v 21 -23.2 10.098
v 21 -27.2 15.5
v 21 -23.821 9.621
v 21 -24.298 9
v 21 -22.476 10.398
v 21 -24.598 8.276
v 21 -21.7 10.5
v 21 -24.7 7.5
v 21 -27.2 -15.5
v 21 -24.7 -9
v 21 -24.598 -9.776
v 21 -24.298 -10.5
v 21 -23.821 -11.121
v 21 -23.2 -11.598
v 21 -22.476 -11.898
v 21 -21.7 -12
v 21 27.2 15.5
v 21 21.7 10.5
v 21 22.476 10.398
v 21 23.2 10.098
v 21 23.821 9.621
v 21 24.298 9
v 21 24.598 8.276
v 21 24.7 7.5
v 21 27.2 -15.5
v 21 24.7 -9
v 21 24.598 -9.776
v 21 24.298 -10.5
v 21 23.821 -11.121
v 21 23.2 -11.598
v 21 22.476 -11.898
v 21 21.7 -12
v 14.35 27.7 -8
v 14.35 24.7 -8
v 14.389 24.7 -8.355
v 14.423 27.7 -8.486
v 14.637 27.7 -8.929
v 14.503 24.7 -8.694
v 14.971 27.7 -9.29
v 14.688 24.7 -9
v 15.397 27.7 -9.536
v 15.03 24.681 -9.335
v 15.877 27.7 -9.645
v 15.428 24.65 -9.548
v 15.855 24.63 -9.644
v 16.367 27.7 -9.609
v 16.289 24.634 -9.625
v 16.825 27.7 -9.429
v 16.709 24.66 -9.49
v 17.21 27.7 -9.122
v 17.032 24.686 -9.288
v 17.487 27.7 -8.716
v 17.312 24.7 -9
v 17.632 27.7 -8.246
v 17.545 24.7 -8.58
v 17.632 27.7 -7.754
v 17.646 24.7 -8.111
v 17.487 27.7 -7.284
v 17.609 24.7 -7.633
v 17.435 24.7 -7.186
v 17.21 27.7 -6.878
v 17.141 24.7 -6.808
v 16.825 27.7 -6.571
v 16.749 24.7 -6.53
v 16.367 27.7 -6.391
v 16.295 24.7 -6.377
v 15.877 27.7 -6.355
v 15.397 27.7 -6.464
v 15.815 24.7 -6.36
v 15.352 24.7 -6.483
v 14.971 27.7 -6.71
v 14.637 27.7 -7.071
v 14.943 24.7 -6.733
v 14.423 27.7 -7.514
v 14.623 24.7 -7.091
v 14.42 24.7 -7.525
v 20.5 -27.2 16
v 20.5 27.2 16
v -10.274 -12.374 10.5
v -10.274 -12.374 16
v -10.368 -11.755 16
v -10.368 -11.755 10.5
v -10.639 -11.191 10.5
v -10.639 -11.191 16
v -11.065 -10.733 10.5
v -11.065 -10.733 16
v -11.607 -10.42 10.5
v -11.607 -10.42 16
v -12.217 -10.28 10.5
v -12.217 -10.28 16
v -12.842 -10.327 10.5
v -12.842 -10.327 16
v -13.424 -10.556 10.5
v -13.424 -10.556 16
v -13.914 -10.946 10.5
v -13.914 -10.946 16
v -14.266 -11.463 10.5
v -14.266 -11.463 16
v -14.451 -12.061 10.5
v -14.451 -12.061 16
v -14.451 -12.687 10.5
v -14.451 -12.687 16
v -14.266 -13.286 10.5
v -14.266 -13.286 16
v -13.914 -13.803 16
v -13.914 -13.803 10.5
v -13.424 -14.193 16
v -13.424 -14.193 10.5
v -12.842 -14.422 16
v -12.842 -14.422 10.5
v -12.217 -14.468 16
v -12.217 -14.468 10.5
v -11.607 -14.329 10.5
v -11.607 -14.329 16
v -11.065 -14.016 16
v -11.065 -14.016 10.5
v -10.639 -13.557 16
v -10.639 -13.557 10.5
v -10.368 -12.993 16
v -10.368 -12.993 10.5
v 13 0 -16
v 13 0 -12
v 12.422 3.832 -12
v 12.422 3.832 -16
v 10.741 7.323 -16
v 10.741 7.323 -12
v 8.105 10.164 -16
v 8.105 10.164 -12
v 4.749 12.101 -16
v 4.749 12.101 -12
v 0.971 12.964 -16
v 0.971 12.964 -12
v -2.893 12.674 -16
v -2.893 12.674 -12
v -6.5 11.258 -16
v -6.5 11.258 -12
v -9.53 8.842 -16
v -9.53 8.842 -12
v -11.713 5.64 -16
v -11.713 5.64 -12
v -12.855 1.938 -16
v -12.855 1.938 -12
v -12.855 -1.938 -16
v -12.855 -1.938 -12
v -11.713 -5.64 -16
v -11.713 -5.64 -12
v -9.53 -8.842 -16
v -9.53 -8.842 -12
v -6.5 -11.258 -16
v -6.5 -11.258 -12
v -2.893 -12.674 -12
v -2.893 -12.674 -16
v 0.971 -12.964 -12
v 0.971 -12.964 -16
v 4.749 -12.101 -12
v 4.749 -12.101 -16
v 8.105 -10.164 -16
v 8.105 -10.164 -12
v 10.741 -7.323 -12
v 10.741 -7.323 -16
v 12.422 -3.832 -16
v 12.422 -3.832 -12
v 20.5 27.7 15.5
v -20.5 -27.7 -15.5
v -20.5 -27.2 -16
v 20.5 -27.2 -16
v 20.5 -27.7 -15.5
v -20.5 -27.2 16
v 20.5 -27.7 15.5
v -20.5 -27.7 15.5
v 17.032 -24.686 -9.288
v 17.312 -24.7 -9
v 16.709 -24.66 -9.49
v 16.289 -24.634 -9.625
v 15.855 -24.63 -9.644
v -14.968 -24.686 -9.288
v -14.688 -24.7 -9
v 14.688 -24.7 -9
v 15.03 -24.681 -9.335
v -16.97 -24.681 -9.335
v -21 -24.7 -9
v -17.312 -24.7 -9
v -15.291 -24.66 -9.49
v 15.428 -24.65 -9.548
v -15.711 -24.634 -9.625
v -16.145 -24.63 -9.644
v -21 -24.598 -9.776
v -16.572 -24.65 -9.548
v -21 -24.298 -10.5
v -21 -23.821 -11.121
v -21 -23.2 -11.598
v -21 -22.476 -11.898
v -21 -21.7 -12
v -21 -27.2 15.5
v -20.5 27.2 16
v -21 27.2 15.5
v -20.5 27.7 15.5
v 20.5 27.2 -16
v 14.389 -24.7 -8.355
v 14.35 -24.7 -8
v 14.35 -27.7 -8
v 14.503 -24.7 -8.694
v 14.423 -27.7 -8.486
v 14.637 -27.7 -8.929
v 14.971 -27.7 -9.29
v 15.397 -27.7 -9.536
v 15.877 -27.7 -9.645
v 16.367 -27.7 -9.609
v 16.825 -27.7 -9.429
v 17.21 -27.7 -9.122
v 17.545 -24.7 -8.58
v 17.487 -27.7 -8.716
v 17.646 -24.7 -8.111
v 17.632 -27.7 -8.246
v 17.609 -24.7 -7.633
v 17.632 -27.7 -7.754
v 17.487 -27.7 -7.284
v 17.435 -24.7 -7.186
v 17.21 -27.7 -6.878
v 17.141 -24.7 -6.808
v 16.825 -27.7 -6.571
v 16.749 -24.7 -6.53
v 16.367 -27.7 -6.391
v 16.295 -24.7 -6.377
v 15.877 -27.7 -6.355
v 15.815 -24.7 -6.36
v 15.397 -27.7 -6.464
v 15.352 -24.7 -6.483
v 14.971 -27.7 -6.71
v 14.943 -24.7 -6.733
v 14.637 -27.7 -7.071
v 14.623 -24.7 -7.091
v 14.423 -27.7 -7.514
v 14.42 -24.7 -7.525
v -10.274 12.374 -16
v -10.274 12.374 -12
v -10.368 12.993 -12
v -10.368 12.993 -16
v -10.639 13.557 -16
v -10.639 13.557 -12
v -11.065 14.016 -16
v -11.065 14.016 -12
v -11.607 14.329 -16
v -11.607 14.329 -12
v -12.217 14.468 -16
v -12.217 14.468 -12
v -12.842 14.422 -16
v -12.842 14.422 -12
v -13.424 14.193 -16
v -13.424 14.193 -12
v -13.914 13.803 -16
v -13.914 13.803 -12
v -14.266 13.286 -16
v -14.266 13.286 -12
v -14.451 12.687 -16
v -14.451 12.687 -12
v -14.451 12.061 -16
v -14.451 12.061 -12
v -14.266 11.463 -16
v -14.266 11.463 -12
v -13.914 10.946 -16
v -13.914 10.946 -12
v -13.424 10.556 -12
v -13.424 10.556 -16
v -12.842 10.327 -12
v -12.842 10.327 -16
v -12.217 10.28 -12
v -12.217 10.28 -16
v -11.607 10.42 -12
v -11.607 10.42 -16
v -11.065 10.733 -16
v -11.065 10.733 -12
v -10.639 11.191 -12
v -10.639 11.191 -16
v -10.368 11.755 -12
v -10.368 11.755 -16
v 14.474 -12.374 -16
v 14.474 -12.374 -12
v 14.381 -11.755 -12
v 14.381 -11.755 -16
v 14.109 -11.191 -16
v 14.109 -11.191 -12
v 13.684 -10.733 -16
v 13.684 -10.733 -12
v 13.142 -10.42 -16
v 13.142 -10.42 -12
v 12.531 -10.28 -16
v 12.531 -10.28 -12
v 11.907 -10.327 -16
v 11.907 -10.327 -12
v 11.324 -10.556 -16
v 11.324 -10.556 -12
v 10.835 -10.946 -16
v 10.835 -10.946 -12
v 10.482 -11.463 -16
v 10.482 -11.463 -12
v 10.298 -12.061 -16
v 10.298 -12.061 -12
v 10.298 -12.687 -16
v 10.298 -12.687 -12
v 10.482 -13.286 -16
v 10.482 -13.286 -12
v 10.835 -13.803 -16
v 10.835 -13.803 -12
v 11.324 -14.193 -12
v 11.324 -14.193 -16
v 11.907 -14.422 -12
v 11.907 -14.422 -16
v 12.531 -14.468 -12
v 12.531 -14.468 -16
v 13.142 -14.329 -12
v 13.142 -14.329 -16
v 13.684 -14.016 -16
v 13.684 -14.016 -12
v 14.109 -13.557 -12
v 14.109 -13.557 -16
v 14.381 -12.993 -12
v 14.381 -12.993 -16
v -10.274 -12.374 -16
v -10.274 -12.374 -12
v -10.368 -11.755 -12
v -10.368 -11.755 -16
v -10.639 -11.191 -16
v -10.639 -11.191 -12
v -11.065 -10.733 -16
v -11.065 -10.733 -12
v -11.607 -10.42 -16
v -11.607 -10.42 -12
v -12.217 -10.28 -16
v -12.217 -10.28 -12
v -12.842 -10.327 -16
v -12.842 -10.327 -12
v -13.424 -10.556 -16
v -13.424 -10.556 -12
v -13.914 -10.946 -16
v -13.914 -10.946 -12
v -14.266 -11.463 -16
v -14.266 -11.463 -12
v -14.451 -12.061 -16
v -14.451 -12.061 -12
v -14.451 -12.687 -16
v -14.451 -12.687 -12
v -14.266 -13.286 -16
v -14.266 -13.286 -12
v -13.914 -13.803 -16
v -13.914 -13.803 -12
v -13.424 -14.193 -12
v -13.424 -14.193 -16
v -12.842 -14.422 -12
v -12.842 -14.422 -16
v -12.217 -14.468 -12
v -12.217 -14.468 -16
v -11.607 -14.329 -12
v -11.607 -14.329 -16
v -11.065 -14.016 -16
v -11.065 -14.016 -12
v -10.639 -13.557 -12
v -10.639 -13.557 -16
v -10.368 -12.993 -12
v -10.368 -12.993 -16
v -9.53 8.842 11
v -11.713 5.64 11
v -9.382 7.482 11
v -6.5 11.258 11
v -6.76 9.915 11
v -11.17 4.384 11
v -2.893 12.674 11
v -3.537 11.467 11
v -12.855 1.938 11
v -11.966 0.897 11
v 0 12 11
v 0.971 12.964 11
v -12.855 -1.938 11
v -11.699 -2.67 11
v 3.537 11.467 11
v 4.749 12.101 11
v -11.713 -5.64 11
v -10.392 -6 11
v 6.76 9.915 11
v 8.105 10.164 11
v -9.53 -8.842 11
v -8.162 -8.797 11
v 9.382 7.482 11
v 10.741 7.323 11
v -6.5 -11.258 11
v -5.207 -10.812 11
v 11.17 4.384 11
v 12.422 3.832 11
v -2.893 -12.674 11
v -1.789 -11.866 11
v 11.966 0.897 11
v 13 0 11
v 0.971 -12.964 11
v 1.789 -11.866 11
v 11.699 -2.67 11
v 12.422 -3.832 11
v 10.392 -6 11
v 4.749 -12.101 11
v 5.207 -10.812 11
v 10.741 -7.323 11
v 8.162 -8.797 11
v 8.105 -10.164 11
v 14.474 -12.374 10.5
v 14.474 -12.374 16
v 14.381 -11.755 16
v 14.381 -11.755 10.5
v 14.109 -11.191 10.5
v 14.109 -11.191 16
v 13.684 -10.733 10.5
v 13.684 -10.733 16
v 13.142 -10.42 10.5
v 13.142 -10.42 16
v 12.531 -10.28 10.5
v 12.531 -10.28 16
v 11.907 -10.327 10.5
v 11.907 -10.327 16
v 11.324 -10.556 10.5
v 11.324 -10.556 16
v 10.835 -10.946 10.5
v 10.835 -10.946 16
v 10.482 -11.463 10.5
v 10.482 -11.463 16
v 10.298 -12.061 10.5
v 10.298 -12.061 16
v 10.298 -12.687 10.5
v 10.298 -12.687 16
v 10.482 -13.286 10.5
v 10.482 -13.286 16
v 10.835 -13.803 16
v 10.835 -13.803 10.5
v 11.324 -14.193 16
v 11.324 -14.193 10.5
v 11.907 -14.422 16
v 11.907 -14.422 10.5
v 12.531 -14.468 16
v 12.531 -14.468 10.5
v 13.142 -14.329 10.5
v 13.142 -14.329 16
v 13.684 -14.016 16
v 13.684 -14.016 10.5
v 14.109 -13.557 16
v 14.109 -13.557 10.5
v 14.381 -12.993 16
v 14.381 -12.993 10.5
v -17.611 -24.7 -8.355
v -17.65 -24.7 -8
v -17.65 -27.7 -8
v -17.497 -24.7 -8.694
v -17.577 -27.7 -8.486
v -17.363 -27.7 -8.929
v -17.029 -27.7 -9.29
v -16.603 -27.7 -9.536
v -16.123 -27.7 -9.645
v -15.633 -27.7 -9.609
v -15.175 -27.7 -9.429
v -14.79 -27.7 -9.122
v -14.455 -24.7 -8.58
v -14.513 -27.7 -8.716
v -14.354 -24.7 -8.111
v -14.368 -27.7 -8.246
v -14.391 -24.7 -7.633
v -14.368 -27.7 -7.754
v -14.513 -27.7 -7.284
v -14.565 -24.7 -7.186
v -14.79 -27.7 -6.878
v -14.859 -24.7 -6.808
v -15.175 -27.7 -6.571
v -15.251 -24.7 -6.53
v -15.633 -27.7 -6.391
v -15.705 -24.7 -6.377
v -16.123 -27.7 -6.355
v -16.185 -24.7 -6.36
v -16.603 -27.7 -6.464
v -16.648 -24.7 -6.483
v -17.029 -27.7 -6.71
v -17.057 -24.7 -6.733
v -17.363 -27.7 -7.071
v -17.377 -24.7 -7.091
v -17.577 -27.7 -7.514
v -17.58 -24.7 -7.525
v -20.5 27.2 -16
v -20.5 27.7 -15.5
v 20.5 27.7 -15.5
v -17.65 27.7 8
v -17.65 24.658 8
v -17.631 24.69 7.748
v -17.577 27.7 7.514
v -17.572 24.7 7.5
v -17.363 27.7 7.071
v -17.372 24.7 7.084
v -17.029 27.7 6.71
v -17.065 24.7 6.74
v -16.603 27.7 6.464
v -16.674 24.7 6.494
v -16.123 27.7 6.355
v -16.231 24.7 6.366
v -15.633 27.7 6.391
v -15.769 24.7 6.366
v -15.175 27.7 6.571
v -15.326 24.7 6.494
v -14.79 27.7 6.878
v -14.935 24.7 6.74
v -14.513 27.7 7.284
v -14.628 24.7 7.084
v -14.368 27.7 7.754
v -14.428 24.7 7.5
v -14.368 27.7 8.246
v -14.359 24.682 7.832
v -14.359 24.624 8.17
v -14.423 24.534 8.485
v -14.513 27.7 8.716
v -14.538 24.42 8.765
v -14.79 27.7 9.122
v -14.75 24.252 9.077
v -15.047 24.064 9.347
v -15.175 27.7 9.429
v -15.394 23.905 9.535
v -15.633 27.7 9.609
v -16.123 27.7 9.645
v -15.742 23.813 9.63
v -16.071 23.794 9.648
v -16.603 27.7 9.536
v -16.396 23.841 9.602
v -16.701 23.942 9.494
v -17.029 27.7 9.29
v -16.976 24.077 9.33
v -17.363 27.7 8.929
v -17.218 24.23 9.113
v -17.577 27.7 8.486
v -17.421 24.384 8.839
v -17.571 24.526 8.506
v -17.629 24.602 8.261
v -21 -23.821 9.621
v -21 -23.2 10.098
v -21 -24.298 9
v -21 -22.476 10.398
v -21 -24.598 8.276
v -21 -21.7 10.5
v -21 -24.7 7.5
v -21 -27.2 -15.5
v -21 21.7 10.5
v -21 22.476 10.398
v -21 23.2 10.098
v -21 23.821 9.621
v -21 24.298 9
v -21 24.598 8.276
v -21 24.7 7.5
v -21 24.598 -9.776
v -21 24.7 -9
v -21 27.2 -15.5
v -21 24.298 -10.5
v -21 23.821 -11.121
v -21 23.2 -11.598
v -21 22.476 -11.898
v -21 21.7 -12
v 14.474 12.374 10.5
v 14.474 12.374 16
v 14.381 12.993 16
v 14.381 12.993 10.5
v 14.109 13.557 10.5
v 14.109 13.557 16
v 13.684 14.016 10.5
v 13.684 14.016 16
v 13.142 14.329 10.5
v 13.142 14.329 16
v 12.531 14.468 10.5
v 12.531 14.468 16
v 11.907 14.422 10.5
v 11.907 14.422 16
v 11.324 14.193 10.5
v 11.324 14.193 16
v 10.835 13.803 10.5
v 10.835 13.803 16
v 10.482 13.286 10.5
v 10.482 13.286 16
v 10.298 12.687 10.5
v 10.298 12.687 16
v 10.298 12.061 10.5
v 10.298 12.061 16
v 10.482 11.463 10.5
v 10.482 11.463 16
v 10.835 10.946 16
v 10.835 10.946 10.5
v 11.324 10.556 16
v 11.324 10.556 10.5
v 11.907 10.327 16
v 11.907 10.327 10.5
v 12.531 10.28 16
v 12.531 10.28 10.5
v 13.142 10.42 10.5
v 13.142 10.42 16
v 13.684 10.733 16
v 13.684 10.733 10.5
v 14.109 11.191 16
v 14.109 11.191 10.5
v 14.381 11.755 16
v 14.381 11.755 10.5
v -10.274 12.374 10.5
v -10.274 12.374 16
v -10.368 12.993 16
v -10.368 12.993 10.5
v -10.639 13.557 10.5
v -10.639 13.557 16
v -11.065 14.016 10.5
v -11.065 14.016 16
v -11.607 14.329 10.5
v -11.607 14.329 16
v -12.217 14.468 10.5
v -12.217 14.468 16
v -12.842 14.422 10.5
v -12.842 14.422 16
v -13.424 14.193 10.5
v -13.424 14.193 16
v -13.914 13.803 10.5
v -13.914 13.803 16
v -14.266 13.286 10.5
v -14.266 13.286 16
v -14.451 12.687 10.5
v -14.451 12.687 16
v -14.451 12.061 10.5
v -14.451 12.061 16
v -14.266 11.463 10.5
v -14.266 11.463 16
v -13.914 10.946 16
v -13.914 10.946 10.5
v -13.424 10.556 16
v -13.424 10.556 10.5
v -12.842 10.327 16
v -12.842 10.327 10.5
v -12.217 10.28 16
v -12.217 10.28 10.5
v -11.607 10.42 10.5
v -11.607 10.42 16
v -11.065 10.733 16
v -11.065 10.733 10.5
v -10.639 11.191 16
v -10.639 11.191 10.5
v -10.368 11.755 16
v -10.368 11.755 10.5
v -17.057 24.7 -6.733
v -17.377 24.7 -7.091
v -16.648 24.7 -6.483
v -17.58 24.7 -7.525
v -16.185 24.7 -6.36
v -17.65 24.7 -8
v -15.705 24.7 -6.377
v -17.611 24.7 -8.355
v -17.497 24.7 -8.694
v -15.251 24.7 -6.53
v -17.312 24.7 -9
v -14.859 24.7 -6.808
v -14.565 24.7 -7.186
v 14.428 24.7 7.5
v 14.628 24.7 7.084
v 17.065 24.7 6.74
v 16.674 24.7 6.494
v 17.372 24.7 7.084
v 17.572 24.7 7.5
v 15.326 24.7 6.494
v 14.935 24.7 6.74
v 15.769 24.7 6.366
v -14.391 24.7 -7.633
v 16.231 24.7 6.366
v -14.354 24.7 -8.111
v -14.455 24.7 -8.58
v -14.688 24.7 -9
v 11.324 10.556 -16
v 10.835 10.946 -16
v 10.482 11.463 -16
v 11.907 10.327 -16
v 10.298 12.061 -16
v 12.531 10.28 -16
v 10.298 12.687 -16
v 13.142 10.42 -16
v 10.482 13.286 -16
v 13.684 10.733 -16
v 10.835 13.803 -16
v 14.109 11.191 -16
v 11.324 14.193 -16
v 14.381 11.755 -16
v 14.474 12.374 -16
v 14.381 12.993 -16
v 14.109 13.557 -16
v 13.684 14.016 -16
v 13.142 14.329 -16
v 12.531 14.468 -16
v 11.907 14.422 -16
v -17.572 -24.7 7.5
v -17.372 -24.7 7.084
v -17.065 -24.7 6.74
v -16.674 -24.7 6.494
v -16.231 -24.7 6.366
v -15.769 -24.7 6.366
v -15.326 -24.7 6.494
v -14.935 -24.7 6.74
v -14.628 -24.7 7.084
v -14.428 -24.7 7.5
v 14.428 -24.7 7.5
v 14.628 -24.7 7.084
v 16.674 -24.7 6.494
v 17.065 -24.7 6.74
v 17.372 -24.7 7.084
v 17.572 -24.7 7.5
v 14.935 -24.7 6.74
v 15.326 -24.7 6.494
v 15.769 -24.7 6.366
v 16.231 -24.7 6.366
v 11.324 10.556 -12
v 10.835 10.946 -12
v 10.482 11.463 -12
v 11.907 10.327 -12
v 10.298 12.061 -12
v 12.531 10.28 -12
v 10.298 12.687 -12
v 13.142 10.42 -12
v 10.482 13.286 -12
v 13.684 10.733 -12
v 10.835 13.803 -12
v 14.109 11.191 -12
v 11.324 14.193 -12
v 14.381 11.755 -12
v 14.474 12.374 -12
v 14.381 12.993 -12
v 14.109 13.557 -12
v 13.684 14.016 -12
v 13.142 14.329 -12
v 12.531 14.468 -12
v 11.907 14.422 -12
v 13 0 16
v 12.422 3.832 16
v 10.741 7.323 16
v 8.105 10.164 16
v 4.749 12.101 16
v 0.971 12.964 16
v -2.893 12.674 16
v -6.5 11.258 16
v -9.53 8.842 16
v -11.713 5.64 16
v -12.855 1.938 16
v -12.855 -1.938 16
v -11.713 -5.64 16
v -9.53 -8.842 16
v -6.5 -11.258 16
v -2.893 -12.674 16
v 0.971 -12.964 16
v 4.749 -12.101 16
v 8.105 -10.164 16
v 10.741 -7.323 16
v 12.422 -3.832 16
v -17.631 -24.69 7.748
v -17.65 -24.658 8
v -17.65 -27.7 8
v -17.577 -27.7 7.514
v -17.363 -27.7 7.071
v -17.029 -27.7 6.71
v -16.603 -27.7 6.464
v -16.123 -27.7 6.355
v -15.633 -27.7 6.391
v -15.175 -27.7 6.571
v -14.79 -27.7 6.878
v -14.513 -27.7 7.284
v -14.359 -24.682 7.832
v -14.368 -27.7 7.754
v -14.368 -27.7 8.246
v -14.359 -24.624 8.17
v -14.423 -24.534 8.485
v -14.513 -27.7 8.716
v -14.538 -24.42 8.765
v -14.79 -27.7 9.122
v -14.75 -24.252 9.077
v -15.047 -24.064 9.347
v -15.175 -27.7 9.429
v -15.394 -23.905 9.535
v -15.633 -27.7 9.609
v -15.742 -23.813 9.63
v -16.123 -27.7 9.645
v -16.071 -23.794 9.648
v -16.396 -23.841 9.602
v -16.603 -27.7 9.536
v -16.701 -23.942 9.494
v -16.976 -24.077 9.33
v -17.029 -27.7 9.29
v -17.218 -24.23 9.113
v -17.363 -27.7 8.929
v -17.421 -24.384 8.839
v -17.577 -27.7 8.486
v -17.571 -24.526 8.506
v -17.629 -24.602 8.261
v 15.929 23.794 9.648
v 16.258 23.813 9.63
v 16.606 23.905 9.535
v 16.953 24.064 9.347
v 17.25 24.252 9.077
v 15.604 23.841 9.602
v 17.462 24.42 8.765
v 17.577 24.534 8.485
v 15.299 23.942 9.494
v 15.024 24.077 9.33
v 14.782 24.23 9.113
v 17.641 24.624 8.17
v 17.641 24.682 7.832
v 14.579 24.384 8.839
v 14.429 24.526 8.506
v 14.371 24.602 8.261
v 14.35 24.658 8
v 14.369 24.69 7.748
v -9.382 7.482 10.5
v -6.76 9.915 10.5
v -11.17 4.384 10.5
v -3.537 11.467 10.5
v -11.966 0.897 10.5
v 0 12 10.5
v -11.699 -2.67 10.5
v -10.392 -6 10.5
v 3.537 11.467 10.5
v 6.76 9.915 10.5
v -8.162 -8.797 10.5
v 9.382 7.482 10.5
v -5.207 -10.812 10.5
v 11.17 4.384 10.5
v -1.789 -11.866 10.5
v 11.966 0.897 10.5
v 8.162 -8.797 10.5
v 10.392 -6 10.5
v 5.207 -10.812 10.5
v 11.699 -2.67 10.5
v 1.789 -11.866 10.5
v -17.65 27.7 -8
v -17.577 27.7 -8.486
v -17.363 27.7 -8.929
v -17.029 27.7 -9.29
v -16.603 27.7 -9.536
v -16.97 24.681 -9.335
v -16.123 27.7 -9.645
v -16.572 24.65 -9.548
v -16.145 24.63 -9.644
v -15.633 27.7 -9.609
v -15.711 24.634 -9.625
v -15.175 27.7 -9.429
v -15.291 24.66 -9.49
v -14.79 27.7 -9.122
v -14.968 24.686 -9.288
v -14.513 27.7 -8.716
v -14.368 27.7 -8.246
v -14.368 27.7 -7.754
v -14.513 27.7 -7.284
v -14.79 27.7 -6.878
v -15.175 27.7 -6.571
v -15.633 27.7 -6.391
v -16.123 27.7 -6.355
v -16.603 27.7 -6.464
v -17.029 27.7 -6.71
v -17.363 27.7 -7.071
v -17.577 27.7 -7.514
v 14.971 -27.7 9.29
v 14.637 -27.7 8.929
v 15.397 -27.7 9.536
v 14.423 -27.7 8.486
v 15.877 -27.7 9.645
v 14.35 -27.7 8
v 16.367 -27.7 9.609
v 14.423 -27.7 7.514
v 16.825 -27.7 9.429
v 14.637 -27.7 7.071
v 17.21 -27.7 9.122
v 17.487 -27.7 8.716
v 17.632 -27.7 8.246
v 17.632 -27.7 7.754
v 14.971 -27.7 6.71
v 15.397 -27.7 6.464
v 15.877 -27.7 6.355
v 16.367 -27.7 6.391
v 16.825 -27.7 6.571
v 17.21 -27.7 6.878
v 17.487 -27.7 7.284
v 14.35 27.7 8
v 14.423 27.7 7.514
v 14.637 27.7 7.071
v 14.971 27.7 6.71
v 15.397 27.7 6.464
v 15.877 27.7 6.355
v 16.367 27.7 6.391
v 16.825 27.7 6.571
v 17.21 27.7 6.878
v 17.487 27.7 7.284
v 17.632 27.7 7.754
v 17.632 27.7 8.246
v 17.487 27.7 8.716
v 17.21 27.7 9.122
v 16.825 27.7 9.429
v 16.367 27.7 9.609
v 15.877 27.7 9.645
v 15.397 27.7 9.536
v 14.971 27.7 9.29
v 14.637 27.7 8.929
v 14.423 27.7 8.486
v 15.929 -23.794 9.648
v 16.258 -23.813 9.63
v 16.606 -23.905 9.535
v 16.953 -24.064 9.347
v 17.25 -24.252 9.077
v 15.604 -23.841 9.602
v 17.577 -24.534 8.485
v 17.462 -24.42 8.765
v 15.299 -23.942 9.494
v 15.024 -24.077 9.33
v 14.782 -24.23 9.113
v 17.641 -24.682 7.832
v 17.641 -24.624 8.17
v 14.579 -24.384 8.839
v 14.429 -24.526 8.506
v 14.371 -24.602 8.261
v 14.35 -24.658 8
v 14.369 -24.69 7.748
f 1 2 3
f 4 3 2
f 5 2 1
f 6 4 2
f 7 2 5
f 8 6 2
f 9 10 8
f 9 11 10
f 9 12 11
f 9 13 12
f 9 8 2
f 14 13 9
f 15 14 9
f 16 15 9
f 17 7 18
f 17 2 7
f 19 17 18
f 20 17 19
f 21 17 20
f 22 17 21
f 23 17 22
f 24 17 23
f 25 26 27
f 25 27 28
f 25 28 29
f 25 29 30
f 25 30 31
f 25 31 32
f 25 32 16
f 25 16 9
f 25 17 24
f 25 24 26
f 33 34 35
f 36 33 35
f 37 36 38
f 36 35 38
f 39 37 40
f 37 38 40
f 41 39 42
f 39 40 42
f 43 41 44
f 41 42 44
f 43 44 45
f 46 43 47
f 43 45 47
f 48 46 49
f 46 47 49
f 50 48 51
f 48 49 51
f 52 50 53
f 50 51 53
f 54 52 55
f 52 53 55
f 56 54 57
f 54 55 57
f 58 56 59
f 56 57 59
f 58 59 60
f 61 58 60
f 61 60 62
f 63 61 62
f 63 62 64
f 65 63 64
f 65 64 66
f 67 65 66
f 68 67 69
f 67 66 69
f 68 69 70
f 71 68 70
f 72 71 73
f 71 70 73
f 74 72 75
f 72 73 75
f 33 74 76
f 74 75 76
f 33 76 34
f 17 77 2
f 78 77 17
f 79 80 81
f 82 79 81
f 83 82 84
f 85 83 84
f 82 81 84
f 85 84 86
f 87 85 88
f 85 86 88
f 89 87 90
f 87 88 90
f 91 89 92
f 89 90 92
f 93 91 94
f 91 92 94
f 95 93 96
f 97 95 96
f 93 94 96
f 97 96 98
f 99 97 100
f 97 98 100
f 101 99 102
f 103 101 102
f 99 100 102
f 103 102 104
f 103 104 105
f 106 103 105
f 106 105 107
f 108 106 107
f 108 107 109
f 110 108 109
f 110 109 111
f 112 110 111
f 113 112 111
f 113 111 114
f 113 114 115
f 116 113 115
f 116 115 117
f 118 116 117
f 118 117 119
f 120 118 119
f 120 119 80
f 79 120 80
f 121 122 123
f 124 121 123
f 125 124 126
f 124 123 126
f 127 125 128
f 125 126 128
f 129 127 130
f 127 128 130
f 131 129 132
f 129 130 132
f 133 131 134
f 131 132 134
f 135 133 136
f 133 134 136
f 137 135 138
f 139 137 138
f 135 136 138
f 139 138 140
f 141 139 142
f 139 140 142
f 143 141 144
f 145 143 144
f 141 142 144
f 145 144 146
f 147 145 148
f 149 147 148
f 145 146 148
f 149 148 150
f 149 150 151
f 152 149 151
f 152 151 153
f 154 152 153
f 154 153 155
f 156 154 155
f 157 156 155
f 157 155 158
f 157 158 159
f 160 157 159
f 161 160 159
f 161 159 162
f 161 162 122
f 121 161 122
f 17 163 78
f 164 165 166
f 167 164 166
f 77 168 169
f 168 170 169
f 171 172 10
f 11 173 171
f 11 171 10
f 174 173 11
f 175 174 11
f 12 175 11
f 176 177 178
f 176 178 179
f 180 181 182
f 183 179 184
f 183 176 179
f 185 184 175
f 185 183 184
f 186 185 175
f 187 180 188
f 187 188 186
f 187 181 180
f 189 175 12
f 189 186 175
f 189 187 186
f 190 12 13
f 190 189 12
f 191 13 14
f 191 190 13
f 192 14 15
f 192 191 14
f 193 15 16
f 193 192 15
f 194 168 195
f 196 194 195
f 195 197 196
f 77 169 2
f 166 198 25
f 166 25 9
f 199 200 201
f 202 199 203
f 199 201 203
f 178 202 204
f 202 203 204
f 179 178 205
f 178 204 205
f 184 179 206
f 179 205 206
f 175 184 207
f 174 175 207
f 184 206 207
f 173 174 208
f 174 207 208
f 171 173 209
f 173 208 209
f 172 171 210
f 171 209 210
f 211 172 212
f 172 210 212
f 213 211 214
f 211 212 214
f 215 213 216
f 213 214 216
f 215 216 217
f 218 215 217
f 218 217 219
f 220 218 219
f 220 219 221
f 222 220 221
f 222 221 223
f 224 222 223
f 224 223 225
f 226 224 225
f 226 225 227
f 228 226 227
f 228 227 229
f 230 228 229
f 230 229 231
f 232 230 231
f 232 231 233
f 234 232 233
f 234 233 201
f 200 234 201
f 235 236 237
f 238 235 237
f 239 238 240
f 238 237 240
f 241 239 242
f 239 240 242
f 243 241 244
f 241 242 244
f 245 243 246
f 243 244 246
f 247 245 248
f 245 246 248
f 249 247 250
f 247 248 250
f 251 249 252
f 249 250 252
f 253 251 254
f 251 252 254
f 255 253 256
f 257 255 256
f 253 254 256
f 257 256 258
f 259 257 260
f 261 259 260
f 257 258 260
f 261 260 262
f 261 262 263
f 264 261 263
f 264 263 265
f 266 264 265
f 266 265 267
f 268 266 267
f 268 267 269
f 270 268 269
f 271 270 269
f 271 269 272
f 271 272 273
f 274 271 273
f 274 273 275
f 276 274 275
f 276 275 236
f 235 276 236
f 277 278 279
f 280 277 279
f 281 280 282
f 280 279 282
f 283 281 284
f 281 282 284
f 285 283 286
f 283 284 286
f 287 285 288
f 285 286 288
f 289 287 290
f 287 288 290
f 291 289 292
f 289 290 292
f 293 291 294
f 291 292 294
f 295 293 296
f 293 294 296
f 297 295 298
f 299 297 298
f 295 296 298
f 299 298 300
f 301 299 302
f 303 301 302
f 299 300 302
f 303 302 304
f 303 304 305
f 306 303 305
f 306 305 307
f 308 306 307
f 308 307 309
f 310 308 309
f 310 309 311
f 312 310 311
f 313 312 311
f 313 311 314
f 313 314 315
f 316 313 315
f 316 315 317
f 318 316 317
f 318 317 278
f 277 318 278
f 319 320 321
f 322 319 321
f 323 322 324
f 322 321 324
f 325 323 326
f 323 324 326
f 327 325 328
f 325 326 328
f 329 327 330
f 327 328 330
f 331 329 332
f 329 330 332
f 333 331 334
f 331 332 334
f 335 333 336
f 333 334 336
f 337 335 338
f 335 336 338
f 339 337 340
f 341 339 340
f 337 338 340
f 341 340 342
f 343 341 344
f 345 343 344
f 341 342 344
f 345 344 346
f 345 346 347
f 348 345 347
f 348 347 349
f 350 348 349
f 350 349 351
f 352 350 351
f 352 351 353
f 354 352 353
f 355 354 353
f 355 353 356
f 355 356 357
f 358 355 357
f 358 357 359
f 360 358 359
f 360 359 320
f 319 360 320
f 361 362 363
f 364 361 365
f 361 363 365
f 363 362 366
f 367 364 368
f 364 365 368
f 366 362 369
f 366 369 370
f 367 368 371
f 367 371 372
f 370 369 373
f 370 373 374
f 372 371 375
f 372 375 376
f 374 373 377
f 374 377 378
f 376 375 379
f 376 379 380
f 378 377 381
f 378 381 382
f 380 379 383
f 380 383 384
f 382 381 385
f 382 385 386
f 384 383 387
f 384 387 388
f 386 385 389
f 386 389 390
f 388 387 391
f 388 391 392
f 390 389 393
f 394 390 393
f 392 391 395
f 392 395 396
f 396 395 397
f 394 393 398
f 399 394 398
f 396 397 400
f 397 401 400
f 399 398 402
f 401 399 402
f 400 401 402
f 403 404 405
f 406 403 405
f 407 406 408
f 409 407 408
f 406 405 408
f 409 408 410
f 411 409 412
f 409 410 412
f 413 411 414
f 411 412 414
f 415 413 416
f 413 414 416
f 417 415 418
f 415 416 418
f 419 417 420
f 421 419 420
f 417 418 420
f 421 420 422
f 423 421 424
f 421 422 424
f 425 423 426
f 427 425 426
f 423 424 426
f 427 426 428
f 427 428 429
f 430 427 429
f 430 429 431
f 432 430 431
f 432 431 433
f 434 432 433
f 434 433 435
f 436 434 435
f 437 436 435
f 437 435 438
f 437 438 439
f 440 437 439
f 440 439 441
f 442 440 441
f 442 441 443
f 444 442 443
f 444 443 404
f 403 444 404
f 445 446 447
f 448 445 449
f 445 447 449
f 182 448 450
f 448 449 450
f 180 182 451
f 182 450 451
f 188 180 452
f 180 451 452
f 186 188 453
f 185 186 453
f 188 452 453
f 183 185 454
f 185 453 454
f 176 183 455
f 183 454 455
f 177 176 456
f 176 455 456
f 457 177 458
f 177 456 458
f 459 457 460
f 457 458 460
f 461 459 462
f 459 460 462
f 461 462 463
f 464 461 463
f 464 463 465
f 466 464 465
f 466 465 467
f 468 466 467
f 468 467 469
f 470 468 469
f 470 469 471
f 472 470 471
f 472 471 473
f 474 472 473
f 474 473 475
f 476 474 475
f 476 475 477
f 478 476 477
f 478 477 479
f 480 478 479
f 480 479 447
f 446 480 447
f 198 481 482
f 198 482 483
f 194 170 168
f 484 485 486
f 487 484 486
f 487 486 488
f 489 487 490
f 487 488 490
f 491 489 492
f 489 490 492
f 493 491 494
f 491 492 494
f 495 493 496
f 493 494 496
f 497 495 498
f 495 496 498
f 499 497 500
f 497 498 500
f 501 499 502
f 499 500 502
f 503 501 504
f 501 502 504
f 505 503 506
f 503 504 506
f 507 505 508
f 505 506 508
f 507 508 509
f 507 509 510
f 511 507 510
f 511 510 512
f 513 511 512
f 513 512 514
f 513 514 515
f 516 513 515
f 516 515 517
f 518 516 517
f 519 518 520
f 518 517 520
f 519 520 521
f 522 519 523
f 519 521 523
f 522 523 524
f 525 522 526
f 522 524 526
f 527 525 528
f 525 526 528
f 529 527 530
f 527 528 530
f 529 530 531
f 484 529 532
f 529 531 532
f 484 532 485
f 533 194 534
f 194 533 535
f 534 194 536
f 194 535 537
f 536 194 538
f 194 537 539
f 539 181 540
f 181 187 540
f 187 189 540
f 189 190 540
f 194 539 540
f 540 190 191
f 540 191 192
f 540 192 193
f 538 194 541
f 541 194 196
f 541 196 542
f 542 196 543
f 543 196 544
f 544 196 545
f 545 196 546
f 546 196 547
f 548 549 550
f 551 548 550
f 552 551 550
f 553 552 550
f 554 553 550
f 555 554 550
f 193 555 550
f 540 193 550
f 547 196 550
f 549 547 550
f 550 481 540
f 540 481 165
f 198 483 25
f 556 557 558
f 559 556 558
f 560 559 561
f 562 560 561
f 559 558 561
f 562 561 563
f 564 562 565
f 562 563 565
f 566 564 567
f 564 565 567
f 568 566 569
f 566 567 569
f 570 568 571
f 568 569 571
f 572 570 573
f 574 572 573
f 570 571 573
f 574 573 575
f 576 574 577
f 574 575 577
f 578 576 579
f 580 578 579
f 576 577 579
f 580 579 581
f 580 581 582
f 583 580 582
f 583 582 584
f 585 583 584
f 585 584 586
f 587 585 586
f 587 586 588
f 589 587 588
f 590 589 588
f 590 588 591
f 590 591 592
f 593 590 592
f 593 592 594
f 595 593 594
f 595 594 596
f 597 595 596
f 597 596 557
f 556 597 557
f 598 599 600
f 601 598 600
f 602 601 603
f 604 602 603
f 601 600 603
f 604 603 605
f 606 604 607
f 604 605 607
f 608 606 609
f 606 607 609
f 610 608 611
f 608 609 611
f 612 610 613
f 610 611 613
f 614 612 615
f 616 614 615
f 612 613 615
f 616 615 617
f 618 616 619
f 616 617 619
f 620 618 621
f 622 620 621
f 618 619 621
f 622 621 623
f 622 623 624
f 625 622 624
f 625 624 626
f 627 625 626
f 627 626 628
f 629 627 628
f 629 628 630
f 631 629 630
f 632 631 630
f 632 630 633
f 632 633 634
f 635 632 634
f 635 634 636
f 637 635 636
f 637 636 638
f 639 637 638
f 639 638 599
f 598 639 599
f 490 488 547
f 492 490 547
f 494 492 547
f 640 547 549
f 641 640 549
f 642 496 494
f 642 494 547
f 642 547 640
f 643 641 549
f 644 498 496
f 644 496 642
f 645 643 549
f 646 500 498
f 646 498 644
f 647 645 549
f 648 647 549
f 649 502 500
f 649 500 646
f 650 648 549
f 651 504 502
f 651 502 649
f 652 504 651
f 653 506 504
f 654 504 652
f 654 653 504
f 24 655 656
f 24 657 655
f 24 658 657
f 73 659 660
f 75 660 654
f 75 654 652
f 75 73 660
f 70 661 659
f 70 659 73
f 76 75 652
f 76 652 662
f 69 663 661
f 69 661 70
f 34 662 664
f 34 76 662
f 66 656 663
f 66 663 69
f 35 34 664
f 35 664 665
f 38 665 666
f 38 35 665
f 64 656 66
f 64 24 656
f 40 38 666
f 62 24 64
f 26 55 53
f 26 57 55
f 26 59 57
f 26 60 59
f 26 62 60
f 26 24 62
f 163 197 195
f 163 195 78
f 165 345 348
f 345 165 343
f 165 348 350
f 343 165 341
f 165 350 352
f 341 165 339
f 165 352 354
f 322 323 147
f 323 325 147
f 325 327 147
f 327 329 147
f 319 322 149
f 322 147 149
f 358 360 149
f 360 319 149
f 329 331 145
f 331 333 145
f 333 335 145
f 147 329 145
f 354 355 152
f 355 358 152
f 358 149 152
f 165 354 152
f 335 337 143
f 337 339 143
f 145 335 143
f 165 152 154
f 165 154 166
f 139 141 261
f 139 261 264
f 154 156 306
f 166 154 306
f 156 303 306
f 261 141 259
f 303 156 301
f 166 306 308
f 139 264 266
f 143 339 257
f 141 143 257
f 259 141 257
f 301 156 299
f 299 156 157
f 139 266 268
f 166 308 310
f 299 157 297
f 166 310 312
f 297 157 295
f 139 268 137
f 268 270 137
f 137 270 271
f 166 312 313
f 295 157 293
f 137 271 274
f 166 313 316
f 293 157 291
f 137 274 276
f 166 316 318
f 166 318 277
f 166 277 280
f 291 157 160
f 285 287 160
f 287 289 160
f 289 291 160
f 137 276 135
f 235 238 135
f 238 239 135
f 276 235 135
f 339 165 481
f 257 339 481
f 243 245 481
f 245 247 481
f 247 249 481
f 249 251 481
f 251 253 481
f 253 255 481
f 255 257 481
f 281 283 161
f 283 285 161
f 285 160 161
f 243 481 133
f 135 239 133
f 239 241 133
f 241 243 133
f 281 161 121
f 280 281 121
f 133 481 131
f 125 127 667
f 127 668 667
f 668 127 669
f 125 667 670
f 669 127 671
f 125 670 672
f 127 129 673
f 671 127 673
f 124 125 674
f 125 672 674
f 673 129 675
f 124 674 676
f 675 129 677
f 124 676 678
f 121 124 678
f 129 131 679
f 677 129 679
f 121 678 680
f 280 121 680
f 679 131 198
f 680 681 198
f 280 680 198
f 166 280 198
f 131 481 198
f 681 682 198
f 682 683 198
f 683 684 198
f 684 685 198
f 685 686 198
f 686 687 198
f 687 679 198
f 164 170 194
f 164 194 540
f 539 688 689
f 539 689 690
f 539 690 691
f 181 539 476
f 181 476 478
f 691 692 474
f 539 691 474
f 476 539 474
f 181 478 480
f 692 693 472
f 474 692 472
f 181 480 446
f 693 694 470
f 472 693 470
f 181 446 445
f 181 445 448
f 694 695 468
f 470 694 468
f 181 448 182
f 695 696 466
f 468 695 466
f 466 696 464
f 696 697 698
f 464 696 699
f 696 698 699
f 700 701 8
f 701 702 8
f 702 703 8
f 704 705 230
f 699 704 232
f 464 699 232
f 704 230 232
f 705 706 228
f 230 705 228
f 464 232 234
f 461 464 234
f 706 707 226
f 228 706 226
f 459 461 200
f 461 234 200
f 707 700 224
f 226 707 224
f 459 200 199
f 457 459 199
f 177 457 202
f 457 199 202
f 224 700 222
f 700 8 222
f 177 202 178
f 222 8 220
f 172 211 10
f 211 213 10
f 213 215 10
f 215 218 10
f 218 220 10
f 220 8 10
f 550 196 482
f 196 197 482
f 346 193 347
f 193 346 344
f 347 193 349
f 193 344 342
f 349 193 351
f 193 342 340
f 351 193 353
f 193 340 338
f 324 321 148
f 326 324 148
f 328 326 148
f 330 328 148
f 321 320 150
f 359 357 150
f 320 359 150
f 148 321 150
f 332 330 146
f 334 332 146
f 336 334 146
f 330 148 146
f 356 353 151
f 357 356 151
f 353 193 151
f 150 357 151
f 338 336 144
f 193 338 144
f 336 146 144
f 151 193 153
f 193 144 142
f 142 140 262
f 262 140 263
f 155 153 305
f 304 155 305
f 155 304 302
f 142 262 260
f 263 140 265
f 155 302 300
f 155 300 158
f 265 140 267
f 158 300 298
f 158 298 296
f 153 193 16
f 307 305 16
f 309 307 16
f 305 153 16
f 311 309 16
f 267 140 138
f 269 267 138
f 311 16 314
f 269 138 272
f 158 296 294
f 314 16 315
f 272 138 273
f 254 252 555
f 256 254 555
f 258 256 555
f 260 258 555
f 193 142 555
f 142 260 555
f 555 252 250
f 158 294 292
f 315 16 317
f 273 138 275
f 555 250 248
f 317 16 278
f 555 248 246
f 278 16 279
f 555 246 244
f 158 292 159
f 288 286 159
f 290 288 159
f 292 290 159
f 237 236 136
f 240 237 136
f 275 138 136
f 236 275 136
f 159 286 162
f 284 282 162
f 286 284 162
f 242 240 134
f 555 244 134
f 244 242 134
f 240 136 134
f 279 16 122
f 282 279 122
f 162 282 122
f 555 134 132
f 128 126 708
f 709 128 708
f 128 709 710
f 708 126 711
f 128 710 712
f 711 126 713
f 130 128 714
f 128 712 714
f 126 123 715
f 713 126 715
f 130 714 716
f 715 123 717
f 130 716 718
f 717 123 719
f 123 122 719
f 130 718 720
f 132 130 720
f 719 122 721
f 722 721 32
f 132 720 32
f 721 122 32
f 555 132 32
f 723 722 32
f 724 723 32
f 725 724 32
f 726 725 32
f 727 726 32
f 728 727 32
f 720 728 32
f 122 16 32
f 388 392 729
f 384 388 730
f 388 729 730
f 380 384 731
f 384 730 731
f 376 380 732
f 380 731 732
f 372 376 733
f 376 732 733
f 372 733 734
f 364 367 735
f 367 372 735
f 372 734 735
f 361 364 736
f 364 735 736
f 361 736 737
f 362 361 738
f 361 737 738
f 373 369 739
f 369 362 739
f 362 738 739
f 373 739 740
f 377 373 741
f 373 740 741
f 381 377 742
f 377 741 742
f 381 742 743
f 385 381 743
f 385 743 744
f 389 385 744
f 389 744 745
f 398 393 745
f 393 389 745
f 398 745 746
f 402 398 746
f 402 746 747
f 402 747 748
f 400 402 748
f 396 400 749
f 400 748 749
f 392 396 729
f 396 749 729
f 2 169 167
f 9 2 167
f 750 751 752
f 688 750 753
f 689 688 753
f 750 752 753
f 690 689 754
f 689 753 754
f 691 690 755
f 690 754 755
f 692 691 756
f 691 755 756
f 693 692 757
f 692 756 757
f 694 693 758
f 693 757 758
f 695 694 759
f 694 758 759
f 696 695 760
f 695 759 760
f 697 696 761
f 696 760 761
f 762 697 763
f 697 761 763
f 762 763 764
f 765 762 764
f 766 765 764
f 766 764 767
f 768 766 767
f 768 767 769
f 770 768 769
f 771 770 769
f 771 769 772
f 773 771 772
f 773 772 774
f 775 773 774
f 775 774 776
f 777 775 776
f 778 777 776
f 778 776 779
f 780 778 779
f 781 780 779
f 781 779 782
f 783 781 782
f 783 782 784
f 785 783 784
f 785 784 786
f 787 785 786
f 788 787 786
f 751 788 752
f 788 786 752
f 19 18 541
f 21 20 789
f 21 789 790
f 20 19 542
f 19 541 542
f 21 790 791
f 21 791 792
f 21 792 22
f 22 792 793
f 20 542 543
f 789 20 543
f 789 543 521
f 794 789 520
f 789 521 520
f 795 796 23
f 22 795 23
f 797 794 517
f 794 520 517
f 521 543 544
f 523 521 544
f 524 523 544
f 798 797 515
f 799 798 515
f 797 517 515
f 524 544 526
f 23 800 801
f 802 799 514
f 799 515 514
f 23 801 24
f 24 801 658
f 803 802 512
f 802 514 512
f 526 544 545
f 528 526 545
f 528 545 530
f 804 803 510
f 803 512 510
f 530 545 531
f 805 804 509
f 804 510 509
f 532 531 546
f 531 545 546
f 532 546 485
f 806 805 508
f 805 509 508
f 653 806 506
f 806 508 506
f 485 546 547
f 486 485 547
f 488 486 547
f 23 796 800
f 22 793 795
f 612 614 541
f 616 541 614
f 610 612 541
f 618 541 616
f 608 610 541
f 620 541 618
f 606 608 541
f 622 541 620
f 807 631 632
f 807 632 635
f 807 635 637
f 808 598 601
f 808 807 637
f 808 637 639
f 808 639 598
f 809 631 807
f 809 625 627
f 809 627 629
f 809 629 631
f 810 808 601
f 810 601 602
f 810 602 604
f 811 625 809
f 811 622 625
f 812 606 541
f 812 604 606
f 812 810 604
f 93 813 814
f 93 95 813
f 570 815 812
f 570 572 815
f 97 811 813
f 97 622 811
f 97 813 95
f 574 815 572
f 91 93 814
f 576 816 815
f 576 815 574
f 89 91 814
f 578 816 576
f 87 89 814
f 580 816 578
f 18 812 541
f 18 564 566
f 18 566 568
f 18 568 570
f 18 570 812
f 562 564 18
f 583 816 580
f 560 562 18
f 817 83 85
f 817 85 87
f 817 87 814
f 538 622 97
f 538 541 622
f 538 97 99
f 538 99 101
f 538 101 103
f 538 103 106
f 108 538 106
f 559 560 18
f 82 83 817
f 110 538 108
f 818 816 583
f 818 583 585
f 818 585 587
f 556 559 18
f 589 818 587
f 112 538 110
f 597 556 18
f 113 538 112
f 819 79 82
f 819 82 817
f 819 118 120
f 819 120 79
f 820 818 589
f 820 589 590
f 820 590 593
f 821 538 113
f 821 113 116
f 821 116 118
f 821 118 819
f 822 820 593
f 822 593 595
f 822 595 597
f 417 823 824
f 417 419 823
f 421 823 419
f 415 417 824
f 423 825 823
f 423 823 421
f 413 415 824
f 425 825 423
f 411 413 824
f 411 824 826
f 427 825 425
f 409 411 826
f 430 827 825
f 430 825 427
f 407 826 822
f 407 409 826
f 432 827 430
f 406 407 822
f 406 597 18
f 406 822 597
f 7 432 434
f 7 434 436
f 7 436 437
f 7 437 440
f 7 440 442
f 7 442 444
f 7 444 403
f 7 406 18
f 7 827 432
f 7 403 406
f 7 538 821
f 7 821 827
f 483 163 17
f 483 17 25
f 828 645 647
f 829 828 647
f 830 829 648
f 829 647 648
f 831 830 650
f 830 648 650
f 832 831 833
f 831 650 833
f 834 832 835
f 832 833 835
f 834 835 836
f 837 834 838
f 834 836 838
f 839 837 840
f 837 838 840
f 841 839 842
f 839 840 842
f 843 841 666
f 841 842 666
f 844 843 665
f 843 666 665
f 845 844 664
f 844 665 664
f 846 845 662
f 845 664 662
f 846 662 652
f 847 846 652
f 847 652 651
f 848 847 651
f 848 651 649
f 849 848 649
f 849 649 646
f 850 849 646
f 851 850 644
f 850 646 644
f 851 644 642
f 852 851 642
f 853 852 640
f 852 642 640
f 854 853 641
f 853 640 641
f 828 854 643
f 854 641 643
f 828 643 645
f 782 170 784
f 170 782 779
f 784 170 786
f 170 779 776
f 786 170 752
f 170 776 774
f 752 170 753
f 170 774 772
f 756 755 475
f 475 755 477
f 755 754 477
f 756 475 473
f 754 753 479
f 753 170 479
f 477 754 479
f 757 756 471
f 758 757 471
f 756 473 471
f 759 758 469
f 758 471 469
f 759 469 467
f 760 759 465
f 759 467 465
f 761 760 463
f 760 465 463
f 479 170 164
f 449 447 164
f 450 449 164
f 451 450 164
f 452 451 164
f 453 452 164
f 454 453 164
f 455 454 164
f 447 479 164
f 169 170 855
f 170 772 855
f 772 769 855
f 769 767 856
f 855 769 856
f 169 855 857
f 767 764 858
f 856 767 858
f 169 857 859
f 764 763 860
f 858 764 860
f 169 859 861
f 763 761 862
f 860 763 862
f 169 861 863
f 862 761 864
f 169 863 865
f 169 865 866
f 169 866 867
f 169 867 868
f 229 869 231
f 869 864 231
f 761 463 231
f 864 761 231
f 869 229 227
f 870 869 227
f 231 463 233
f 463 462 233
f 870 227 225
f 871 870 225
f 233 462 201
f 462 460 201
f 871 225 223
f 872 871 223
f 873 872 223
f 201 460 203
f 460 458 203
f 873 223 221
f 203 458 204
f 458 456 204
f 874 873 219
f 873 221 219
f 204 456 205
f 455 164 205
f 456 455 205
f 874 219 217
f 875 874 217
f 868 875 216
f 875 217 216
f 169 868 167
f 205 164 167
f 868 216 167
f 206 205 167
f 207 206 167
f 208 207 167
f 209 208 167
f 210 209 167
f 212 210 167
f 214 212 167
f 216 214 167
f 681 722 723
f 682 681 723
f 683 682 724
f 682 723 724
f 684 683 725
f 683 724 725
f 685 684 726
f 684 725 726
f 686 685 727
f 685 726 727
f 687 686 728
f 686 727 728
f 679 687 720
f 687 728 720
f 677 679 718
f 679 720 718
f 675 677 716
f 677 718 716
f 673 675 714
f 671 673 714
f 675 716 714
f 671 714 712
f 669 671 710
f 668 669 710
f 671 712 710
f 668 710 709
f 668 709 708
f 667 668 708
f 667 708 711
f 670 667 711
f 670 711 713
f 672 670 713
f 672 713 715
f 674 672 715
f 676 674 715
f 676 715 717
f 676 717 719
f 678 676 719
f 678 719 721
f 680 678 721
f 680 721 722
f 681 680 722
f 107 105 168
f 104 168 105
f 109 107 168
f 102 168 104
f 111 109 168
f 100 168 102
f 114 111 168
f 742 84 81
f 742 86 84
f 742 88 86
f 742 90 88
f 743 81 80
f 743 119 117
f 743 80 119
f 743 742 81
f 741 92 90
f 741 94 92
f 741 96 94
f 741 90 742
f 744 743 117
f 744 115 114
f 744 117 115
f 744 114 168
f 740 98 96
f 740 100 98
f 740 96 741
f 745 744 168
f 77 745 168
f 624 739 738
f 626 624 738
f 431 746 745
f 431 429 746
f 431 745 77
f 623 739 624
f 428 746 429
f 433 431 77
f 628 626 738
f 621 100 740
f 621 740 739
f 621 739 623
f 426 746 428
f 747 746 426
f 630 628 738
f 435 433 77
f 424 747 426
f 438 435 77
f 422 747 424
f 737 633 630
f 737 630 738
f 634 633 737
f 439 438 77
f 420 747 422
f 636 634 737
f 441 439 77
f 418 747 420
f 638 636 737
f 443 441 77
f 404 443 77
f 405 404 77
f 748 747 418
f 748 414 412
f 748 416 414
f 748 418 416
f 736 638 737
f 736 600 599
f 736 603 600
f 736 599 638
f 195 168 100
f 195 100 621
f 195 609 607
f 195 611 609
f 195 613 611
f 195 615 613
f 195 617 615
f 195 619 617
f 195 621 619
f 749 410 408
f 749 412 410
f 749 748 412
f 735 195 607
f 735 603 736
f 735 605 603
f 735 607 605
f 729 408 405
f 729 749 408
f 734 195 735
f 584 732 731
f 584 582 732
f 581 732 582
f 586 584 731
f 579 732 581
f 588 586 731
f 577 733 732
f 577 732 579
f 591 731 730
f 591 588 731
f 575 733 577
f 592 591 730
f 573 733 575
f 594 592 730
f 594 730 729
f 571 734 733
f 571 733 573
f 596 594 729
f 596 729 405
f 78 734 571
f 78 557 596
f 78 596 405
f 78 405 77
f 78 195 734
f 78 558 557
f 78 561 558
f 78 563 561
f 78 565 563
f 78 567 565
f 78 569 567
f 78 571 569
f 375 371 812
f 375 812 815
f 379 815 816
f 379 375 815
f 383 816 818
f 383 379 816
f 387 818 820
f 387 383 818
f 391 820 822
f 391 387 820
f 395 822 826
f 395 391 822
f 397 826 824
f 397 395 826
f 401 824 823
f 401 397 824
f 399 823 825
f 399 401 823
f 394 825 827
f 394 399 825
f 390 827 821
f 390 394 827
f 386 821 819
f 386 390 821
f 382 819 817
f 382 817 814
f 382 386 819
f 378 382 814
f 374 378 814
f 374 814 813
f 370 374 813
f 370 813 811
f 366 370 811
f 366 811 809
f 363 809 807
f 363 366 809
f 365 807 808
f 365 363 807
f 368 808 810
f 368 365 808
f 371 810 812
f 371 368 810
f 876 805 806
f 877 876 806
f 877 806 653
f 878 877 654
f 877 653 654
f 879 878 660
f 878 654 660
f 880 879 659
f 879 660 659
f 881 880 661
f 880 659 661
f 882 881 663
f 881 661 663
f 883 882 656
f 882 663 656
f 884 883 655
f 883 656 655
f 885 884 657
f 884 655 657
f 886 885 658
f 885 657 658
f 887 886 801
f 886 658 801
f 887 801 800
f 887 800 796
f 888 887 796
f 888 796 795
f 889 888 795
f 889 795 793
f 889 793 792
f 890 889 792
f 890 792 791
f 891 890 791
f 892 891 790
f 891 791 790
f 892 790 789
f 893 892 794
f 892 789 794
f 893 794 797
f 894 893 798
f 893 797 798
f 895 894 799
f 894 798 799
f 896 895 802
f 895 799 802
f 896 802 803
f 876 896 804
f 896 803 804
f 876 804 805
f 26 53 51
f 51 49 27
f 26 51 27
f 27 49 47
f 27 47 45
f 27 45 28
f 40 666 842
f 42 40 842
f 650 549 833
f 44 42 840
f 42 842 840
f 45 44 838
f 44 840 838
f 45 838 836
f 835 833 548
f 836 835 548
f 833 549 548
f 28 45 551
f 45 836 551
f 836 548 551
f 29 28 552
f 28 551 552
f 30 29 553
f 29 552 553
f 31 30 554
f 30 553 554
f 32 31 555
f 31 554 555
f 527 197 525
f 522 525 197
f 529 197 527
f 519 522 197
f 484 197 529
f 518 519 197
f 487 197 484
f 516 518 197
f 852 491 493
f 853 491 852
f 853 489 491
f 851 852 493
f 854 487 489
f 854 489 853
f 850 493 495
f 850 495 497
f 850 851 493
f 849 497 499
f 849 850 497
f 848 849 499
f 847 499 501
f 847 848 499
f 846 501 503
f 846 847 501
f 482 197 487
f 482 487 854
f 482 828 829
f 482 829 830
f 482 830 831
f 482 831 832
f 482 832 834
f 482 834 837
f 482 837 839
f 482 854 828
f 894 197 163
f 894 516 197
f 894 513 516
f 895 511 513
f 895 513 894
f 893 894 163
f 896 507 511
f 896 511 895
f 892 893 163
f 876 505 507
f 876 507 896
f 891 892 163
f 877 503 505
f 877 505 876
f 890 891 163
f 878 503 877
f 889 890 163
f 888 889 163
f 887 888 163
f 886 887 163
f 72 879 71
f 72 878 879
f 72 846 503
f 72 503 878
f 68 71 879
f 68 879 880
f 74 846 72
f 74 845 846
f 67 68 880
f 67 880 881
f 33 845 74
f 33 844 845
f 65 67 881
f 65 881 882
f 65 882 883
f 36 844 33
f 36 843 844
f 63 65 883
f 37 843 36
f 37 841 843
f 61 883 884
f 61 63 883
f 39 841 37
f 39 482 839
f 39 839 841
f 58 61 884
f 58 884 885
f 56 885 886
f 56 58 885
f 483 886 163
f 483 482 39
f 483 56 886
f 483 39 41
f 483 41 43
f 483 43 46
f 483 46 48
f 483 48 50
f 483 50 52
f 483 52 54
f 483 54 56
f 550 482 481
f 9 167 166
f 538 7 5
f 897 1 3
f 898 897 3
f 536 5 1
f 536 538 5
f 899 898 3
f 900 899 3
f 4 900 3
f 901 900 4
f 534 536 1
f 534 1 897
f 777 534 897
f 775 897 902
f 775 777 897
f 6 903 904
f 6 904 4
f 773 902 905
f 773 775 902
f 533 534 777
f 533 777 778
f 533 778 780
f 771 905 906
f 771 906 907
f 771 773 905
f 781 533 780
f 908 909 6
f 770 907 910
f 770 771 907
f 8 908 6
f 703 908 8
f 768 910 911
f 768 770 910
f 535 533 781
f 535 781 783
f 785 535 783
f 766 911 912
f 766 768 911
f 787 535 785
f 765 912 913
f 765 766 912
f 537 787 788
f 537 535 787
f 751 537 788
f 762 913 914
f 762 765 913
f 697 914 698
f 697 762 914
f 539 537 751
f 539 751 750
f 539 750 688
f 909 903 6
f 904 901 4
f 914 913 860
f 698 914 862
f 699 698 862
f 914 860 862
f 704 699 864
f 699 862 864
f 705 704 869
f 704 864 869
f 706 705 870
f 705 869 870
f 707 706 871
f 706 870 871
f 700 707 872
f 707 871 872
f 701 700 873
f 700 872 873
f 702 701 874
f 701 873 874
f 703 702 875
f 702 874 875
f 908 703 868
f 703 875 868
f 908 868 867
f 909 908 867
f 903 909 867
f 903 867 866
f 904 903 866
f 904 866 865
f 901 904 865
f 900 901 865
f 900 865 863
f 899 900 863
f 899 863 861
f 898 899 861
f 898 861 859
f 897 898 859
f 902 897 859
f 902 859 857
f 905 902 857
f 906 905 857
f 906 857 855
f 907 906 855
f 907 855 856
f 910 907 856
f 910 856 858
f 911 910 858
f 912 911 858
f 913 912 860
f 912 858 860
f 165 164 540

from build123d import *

# Parameters (mm, degrees)
SKETCH_1_W          = 42
SKETCH_1_H          = 32
EXTRUDE_1_DEPTH     = 27.7
SKETCH_2_R          = 13
CUT_EXTRUDE_1_DEPTH = 48.247116314
SKETCH_3_W          = 22.5
SKETCH_3_H          = 49.4
CUT_EXTRUDE_2_DEPTH = 53.79479141
SKETCH_6_R          = 2.1
CUT_EXTRUDE_4_DEPTH = 50
EXTRUDE_START       = -0.5
SKETCH_7_R          = 13
SKETCH_7_R_2        = 12
EXTRUDE_2_DEPTH     = 0.5
FILLET_2_R          = 3
SKETCH_4_R          = 1.25
CUT_EXTRUDE_3_DEPTH = 7
CHAMFER_1_SIZE      = 0.5
HOLE_WIZARD_M4_1_D  = 3.3


with BuildPart() as part:
    # 草图1 → 凸台-拉伸1 (new, symmetric)
    with BuildSketch(Plane(origin=(0, 0, 0), x_dir=(1, 0, 0), z_dir=(0, 1, 0))):
        Rectangle(SKETCH_1_W, SKETCH_1_H)
    extrude(amount=EXTRUDE_1_DEPTH, both=True)

    # 草图2 → 切除-拉伸1 (cut, through all)
    with BuildSketch(Plane.XY.offset(16)):
        Circle(SKETCH_2_R)
    extrude(amount=-CUT_EXTRUDE_1_DEPTH, mode=Mode.SUBTRACT)

    # 草图3 → 切除-拉伸2 (cut, through all)
    with BuildSketch(Plane(origin=(21, 0, 0), x_dir=(0, 0, -1), z_dir=(1, 0, 0))):
        with Locations((0.75, 0)):
            Rectangle(SKETCH_3_W, SKETCH_3_H)
    extrude(amount=-CUT_EXTRUDE_2_DEPTH, mode=Mode.SUBTRACT)

    # 草图6 → 切除-拉伸4 (cut)
    with BuildSketch(Plane.XY.offset(16)):
        with Locations((12.374368671, 12.374368671)):
            Circle(SKETCH_6_R)
        with Locations((-12.374368671, 12.374368671)):
            Circle(SKETCH_6_R)
        with Locations((12.374368671, -12.374368671)):
            Circle(SKETCH_6_R)
        with Locations((-12.374368671, -12.374368671)):
            Circle(SKETCH_6_R)
    extrude(amount=-CUT_EXTRUDE_4_DEPTH, mode=Mode.SUBTRACT)

    # 草图7 → 凸台-拉伸2 (add)
    with BuildSketch(Plane(origin=(0, 0, 10.5), x_dir=(-1, 0, 0), z_dir=(0, 0, -1)).offset(EXTRUDE_START)):
        with Locations(Location((0, 0, 0), (0, 0, 180))):
            Circle(SKETCH_7_R)
        with Locations(Location((0, 0, 0), (0, 0, 90))):
            Circle(SKETCH_7_R_2, mode=Mode.SUBTRACT)
    extrude(amount=EXTRUDE_2_DEPTH)

    # 圆角2
    fillet_2_edges = [part.edges().sort_by_distance(p)[0] for p in [
        (0, -24.7, 10.5),
        (0, 24.7, -12),
        (0, 24.7, 10.5),
        (0, -24.7, -12),
    ]]
    fillet(fillet_2_edges, radius=FILLET_2_R)

    # 草图4 → 切除-拉伸3 (cut)
    with BuildSketch(Plane(origin=(0, 27.7, 0), x_dir=(1, 0, 0), z_dir=(0, 1, 0))):
        with Locations(Location((-16, 8, 0), (0, 0, 270))):
            Circle(SKETCH_4_R)
        with Locations(Location((16, 8, 0), (0, 0, 270))):
            Circle(SKETCH_4_R)
        with Locations(Location((-16, -8, 0), (0, 0, 270))):
            Circle(SKETCH_4_R)
        with Locations(Location((16, -8, 0), (0, 0, 270))):
            Circle(SKETCH_4_R)
    cut_extrude_3 = extrude(amount=-CUT_EXTRUDE_3_DEPTH, mode=Mode.SUBTRACT)

    # 镜向1: 切除-拉伸3 across plane
    add(cut_extrude_3.mirror(Plane.ZX), mode=Mode.SUBTRACT)

    # 倒角1
    chamfer_1_edges = [part.edges().sort_by_distance(p)[0] for p in [
        (-21, 27.7, 0),
        (0, 27.7, 16),
        (21, 27.7, 0),
        (0, -27.7, 16),
        (-21, -27.7, 0),
        (0, -27.7, -16),
        (21, -27.7, 0),
        (0, 27.7, -16),
        (21, 0, 16),
        (-21, 0, 16),
        (-21, 0, -16),
        (21, 0, -16),
    ]]
    chamfer(chamfer_1_edges, length=CHAMFER_1_SIZE)

    # M4 螺纹孔1 (through all)
    with Locations(Plane(origin=(0, 27.7, 0), x_dir=(1, 0, 0), z_dir=(0, 1, 0))):
        with Locations((16, -8), (16, 8), (-16, 8), (-16, -8)):
            Hole(HOLE_WIZARD_M4_1_D / 2)


solid = part.part
